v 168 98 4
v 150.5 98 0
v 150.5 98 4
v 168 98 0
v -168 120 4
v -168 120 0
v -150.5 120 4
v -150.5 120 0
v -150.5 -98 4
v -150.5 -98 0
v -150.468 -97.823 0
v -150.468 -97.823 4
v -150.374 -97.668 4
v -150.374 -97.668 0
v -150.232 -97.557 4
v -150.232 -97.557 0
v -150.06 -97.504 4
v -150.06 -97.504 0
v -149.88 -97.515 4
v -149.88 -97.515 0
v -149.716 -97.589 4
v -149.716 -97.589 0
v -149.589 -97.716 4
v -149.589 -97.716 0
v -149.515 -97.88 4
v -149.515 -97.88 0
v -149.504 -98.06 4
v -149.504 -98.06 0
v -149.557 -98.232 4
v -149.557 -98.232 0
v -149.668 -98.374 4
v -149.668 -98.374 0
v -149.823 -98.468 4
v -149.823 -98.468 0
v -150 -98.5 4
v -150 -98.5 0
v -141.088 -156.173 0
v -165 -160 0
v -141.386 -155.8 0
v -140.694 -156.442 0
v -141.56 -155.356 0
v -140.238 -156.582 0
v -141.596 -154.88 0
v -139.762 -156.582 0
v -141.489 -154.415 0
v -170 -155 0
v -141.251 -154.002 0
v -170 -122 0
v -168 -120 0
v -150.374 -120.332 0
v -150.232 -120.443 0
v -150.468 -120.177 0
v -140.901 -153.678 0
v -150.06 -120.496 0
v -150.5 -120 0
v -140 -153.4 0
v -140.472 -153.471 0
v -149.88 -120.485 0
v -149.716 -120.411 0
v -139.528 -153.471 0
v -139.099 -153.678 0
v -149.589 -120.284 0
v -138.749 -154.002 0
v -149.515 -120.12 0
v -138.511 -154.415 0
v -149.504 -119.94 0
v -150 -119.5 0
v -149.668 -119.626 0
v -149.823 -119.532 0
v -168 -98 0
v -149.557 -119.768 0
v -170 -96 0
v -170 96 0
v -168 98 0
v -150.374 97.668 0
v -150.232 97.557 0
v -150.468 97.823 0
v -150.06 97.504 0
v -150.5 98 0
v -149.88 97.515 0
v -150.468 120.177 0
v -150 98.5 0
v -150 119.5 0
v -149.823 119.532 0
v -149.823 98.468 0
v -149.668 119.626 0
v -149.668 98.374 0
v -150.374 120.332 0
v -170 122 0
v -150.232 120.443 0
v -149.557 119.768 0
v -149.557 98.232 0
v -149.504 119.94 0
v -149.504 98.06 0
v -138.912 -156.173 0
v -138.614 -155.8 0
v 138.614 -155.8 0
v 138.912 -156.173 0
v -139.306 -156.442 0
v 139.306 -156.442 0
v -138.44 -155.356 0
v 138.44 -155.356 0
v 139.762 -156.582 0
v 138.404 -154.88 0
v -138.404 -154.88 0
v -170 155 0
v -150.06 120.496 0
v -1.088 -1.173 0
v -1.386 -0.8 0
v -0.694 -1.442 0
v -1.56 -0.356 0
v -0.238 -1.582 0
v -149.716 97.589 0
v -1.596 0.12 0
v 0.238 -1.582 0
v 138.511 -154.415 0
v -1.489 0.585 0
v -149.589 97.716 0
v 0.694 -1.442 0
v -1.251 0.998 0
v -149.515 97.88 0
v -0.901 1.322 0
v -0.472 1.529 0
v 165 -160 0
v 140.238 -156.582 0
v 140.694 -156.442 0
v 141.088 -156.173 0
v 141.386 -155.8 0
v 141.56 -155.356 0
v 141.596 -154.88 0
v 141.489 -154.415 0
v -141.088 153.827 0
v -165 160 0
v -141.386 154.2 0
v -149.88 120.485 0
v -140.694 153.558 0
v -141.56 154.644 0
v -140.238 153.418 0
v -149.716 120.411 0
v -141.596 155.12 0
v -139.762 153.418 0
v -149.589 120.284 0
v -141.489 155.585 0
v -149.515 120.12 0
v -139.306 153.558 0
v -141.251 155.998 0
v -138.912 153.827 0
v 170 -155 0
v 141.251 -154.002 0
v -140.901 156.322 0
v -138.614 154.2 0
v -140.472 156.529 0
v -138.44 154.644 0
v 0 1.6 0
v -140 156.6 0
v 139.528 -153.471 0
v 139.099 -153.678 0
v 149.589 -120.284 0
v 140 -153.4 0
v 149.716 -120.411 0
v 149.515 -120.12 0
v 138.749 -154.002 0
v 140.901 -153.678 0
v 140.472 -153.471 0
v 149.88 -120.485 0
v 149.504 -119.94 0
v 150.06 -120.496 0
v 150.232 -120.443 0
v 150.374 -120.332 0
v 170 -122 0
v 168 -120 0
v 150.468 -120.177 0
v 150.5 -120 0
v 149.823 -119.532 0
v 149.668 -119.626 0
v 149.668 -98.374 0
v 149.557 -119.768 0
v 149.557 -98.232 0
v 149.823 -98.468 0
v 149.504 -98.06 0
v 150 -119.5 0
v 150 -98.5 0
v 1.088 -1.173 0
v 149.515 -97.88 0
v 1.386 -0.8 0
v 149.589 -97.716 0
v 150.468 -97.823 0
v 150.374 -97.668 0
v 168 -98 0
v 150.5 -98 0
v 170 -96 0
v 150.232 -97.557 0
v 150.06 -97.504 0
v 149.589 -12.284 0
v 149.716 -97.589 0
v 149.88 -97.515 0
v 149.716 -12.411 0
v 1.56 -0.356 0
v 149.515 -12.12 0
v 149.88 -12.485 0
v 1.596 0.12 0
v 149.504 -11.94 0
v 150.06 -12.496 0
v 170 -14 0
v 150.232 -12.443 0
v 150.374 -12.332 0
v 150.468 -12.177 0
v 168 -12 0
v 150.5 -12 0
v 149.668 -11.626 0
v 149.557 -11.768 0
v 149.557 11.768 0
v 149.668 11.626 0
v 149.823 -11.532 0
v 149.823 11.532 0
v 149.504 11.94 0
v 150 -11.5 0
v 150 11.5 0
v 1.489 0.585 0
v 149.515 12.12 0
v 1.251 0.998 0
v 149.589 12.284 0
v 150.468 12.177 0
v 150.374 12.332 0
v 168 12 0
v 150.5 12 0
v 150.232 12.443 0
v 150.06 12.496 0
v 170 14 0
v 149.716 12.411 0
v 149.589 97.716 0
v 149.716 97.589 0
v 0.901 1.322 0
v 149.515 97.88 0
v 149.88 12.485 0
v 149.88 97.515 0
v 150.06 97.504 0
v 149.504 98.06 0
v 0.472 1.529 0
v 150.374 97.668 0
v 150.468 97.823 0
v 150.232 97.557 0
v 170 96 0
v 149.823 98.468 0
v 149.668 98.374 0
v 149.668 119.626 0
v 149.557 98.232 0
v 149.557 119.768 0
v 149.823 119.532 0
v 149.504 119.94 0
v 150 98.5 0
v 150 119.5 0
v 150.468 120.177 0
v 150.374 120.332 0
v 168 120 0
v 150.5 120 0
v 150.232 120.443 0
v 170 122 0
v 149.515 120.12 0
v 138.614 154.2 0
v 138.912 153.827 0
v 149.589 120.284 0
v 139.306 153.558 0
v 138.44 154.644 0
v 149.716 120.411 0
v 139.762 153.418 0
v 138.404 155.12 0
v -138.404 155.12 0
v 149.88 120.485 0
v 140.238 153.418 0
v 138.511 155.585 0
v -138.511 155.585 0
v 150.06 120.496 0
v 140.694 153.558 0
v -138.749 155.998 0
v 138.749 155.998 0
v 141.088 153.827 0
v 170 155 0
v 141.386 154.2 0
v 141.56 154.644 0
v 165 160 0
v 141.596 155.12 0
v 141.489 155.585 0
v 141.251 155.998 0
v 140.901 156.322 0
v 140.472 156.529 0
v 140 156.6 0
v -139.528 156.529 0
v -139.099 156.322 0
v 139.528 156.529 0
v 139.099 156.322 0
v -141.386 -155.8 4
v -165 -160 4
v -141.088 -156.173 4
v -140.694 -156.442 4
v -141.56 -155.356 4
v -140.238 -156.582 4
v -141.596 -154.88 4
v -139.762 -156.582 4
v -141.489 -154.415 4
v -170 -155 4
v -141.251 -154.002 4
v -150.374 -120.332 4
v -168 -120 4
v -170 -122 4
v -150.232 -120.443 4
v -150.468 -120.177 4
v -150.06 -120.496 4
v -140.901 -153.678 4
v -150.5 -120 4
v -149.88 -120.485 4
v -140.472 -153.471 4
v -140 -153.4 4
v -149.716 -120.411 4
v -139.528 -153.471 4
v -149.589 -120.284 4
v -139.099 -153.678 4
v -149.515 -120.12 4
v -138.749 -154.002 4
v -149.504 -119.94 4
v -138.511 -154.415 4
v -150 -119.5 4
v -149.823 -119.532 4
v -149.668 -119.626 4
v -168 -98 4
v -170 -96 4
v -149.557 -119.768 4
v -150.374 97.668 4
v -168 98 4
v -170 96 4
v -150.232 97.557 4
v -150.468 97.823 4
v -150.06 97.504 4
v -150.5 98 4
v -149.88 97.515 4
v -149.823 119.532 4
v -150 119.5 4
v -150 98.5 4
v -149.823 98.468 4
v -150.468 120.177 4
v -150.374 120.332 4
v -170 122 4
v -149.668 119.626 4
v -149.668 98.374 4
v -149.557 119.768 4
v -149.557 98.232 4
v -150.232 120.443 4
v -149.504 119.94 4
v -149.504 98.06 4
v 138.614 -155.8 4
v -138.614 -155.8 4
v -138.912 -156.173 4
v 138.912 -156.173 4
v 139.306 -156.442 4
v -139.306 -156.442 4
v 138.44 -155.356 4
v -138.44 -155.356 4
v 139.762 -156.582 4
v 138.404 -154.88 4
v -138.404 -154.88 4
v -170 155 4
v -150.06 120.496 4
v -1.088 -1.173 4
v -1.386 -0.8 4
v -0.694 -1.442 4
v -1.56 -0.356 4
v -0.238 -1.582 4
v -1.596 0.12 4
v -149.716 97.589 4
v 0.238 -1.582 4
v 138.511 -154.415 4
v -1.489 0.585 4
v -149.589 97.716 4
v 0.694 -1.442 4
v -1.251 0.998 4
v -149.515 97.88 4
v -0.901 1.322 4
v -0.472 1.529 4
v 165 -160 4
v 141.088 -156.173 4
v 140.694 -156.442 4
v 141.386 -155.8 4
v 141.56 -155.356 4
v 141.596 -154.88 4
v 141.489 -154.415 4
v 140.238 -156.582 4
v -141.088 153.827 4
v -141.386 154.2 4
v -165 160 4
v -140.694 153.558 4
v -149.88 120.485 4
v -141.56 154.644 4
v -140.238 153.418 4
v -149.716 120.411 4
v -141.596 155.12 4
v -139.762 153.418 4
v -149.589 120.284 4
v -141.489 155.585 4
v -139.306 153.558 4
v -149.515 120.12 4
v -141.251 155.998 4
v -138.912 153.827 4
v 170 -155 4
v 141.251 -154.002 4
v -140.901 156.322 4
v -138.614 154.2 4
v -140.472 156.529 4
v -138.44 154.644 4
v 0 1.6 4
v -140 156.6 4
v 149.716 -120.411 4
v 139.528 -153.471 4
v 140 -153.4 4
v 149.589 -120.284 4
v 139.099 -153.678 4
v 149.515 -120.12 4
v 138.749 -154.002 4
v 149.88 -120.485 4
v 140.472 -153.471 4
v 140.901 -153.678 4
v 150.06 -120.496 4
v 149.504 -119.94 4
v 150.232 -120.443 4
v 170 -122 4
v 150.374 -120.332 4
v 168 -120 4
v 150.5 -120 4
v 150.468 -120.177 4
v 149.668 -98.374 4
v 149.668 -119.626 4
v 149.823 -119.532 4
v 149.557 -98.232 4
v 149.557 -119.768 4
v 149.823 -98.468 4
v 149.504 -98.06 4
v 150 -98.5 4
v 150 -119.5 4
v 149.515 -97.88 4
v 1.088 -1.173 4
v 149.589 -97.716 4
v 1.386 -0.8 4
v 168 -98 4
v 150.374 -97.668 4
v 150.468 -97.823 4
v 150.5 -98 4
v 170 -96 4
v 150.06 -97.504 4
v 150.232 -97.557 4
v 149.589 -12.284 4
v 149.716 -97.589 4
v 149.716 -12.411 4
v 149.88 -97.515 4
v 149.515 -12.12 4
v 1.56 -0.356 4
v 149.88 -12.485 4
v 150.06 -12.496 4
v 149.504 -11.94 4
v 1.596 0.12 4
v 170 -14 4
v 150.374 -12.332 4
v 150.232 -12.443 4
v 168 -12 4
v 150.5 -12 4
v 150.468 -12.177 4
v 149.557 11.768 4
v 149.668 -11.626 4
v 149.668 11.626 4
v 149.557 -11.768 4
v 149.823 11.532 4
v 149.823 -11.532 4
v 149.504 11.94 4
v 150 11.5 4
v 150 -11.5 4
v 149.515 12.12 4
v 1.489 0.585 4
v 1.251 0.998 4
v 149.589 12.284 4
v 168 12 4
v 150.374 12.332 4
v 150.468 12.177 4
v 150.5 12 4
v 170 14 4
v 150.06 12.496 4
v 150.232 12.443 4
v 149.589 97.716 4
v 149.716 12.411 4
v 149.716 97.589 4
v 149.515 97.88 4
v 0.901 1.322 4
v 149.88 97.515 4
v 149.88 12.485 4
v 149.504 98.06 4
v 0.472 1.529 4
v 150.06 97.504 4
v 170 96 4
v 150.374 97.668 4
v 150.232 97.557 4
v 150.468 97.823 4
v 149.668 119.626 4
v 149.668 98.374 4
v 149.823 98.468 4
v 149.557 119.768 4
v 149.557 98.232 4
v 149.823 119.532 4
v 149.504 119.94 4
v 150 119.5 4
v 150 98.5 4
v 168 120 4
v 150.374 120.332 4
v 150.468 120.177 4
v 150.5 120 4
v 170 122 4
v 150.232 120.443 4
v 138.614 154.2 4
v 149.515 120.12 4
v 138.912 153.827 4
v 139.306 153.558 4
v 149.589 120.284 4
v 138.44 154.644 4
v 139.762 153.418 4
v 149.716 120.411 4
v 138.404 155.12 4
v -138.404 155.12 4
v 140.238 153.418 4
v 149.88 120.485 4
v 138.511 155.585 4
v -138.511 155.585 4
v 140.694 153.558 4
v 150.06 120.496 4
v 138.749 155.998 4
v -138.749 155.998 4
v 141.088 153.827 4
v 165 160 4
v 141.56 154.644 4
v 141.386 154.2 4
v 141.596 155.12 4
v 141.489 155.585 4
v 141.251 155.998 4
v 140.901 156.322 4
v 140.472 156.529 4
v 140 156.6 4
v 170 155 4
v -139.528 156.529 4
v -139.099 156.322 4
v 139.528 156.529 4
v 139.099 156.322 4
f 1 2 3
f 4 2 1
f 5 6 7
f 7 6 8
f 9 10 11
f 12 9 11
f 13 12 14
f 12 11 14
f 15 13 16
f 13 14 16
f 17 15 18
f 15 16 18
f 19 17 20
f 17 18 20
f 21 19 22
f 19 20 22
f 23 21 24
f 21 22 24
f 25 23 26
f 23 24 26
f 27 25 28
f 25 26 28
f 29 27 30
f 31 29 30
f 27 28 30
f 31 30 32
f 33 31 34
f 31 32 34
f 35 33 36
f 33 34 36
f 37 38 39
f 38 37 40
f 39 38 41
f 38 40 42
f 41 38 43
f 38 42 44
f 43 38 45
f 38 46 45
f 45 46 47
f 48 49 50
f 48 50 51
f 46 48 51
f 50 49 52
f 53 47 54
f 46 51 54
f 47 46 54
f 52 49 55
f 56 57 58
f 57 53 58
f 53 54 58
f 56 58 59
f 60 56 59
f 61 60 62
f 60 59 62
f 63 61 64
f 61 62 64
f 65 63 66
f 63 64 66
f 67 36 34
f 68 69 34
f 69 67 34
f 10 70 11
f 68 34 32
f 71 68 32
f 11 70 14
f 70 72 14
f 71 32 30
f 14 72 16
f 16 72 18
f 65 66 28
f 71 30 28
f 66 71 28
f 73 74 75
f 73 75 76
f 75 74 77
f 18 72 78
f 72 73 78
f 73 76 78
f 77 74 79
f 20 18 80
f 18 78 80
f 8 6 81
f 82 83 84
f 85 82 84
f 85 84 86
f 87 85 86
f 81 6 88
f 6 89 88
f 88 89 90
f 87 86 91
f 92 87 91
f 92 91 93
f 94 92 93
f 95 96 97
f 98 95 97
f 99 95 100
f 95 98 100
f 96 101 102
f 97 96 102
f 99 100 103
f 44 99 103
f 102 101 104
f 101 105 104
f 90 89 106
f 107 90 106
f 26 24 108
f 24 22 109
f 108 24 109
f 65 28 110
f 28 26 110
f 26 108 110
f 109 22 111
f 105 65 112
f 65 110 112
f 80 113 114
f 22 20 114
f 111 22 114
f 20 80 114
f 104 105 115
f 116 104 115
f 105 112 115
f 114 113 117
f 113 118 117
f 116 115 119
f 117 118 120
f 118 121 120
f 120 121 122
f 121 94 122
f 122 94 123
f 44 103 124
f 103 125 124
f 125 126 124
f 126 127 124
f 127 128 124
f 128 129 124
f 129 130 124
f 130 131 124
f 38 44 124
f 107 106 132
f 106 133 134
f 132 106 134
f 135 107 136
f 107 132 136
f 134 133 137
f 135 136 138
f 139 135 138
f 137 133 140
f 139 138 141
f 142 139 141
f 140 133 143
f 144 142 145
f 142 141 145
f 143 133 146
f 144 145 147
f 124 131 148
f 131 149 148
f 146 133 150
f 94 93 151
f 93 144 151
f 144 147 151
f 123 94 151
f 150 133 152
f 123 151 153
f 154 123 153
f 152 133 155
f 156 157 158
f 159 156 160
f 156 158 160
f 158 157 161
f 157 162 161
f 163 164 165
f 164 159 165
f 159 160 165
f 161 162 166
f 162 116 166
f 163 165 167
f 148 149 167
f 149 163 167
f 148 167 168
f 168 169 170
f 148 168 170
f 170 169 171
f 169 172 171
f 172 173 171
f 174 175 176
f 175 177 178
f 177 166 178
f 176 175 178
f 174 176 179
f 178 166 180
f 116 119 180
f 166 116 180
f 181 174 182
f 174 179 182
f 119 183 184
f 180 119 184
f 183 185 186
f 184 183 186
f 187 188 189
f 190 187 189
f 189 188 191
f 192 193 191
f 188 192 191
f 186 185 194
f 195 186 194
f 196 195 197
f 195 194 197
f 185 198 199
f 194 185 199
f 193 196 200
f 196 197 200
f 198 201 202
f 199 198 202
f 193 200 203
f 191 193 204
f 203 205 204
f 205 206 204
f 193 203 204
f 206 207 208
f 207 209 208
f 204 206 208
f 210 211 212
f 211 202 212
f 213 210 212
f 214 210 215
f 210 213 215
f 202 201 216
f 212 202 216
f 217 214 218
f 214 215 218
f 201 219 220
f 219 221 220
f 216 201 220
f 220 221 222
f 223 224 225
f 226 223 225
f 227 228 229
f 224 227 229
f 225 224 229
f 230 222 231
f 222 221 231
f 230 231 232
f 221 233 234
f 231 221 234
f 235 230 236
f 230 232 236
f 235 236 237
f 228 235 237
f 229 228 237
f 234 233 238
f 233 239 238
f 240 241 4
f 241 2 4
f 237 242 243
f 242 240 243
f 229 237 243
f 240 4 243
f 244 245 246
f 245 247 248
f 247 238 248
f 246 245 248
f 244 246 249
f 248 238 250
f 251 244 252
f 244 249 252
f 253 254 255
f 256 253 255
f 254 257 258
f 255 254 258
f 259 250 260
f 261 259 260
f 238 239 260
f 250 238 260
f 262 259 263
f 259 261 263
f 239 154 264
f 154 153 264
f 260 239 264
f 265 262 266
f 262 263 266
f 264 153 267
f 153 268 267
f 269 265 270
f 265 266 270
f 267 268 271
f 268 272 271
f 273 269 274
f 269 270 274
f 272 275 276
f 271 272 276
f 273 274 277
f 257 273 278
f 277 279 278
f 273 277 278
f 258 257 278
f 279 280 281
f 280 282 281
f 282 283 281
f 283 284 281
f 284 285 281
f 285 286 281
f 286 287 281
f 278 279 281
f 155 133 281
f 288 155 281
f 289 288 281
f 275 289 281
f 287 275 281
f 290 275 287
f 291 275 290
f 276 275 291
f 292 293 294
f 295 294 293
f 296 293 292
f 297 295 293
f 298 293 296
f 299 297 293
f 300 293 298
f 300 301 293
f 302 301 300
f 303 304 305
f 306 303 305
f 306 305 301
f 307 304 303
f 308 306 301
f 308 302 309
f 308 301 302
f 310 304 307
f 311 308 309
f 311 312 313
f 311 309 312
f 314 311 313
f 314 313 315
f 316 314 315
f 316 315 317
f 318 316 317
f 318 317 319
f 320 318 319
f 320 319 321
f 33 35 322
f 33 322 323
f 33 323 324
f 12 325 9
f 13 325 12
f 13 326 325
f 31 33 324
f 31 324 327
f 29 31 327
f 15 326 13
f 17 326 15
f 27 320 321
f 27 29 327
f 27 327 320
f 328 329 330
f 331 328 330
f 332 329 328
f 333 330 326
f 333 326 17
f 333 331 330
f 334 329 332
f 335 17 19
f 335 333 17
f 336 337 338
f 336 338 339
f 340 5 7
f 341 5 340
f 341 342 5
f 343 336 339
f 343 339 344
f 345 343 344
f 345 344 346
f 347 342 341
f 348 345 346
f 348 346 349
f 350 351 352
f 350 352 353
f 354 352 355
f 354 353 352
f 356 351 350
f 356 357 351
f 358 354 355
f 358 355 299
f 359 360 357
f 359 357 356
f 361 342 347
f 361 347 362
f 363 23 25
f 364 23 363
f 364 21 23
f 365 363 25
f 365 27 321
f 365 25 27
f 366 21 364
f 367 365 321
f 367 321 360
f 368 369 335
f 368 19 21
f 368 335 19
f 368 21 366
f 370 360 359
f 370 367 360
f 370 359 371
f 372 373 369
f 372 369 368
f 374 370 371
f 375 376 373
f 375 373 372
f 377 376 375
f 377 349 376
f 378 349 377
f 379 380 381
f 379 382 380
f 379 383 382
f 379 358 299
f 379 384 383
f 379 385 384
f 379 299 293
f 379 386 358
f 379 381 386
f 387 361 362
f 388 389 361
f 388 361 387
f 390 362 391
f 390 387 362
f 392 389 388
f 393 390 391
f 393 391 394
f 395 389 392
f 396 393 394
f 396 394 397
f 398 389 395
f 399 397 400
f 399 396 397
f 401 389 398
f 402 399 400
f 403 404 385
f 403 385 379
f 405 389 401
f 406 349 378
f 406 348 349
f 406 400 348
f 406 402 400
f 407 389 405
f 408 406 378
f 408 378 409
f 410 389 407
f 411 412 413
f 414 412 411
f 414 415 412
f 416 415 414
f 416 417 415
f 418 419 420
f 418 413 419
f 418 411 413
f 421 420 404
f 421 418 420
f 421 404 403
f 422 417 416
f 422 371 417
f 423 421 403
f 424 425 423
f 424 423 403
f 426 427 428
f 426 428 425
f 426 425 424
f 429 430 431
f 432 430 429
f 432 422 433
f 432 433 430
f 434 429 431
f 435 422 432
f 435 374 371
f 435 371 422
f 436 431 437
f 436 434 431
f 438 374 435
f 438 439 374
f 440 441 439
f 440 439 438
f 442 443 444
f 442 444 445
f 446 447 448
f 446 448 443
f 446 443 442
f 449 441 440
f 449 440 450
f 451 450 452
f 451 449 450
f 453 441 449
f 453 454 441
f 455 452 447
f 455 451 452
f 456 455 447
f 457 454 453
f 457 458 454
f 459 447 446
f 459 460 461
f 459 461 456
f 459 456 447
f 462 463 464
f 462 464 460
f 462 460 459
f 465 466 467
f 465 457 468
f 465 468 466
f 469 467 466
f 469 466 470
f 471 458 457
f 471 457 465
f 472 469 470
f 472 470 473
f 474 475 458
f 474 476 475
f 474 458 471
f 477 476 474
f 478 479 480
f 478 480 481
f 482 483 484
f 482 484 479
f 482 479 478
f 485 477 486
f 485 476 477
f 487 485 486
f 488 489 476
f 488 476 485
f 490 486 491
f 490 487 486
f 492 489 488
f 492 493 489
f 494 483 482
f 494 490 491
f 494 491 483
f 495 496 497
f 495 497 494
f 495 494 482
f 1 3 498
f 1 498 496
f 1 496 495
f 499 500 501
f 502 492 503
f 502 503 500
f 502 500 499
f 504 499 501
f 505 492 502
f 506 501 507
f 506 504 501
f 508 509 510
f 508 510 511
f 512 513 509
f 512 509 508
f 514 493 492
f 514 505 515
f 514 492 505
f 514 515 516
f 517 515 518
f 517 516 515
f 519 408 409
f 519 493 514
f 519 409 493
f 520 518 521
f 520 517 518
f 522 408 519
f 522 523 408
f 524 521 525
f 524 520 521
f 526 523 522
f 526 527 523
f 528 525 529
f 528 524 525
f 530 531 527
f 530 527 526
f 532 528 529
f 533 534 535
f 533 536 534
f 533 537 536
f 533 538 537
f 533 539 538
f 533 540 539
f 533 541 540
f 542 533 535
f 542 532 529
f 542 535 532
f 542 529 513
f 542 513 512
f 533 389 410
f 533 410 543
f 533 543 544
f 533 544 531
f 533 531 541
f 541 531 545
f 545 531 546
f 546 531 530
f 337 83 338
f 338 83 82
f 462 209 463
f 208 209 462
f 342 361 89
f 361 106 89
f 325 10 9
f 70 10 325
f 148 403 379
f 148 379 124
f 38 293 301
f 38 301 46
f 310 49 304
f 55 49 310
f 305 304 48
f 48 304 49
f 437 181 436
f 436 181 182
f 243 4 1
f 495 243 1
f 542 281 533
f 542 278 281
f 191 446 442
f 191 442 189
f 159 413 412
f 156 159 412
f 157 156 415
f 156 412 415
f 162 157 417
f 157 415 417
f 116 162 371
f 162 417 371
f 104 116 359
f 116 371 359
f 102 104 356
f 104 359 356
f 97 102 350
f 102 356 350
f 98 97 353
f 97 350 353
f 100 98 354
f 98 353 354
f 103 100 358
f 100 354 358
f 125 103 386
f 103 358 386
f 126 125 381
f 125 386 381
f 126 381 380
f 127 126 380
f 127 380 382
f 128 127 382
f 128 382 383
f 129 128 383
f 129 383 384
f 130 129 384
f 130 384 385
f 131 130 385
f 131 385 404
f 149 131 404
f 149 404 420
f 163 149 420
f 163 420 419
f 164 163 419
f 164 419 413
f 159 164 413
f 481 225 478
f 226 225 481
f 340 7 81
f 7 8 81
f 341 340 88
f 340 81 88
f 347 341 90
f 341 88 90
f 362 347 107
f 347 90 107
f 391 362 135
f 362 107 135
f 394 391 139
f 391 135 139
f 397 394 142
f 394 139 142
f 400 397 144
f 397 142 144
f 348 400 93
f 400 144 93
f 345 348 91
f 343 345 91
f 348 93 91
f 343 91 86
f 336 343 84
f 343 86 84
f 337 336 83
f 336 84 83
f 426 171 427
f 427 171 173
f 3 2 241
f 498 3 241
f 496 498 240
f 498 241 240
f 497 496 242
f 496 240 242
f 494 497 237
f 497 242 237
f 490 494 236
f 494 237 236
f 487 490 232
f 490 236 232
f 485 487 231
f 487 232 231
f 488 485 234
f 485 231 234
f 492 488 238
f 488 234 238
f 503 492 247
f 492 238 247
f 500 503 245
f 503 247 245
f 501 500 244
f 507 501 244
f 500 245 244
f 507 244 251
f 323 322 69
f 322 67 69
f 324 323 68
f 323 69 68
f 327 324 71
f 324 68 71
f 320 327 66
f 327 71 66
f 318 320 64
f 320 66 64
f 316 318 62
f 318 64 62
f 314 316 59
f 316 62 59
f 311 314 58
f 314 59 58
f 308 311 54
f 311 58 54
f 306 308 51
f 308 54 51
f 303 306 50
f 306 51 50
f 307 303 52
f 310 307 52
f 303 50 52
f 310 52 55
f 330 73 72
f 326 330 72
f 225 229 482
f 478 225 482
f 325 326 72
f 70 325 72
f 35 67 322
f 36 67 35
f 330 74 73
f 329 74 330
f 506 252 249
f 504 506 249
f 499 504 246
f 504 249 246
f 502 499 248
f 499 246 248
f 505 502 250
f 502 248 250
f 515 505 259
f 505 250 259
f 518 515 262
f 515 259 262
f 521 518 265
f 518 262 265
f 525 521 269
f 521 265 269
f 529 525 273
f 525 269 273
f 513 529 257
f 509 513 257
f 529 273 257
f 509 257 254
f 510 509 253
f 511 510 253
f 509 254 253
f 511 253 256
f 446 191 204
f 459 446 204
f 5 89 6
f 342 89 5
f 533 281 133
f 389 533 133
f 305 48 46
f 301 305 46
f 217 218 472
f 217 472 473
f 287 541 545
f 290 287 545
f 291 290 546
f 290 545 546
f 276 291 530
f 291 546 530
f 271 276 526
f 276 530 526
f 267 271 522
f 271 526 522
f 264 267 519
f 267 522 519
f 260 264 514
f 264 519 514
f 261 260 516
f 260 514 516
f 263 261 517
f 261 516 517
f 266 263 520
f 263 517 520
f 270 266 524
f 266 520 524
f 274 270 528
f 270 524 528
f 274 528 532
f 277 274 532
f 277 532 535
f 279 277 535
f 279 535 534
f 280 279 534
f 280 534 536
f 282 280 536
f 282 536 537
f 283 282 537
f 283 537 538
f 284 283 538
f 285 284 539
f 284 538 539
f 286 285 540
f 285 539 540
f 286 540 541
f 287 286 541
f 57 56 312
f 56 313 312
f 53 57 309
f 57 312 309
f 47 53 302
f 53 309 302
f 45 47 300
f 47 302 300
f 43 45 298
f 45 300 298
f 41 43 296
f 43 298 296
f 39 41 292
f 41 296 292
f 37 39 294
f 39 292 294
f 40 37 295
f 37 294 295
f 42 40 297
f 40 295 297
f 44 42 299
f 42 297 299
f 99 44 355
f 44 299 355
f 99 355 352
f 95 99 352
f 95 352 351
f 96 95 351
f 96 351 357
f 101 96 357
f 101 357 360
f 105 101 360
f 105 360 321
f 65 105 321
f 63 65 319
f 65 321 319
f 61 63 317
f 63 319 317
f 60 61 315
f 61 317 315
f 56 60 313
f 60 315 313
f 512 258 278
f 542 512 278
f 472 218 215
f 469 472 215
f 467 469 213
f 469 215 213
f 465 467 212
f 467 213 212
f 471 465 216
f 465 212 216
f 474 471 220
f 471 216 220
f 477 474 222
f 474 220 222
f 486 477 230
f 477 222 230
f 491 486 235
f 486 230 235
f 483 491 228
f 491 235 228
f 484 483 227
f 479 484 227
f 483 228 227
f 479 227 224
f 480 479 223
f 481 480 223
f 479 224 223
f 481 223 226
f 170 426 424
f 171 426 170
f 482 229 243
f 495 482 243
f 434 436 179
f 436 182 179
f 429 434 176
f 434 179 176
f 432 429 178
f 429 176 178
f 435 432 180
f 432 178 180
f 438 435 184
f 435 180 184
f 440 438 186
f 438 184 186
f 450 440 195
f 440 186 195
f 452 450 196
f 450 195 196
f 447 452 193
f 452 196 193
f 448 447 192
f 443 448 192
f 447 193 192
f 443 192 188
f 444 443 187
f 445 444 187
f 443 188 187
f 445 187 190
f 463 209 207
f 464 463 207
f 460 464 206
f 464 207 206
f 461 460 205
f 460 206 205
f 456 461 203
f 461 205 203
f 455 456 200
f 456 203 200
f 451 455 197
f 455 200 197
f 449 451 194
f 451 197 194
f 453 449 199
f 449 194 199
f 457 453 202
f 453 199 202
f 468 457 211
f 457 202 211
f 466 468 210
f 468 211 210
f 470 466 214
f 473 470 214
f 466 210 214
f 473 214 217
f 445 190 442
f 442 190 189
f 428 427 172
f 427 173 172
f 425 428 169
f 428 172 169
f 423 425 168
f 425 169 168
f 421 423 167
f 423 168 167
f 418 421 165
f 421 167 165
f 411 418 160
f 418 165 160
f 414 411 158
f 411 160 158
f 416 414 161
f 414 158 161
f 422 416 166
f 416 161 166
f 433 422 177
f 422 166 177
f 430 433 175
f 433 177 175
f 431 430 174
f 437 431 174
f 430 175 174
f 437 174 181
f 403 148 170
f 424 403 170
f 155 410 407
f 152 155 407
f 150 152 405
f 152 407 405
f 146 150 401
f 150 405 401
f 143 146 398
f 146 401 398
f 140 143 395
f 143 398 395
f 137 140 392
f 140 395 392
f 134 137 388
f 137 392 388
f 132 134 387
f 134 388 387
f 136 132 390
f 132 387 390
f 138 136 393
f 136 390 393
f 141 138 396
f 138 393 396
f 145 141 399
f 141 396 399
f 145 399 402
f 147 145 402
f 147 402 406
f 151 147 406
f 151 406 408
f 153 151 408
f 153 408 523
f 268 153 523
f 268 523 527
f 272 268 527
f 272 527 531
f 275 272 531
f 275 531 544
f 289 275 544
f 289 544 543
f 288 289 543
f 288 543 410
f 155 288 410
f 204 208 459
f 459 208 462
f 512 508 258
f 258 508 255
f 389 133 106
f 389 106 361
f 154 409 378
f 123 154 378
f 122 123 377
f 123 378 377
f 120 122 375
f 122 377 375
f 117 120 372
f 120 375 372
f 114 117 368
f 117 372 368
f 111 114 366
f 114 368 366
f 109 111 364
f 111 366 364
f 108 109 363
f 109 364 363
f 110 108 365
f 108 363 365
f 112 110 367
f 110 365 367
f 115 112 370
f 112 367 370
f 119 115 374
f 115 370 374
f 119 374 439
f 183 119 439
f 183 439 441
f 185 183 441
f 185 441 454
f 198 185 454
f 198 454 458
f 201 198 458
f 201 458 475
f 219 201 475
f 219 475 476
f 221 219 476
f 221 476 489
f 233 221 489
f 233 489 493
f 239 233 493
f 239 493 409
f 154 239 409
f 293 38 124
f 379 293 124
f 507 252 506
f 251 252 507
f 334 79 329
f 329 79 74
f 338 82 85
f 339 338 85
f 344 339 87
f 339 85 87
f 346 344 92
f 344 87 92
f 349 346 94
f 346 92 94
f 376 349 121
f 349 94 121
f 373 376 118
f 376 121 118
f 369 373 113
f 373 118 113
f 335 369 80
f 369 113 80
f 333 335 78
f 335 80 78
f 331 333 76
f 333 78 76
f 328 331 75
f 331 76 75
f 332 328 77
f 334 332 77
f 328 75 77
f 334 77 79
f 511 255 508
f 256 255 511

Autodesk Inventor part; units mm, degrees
ref_plane "YZ Plane" through (0, 0, 0) normal (1, 0, 0) x (0, 1, 0)
ref_plane "XZ Plane" through (0, 0, 0) normal (0, 1, 0) x (-1, 0, 0)
ref_plane "XY Plane" through (0, 0, 0) normal (0, 0, 1) x (1, 0, 0)
sketch "Sketch1" plane through (0, 0, 0) normal (0, 0, 1) x (1, 0, 0)
  line L0 (-170, -160) -> (170, -160)
  line L1 (170, -160) -> (170, -120)
  line L2 (170, 160) -> (-170, 160)
  line L3 (-170, 160) -> (-170, 120)
  line L4 (-170, -160) -> (170, 160) construction
  line L5 (170, -160) -> (-170, 160) construction
  line L6 (-140, -155) -> (140, -155) construction
  line L7 (140, -155) -> (140, 155) construction
  line L8 (140, 155) -> (-140, 155) construction
  line L9 (-140, 155) -> (-140, -155) construction
  line L10 (-140, -155) -> (140, 155) construction
  line L11 (140, -155) -> (-140, 155) construction
  line L12 (-150, -150) -> (150, -150) construction
  line L13 (150, -150) -> (150, 150) construction
  line L14 (150, 150) -> (-150, 150) construction
  line L15 (-150, 150) -> (-150, -150) construction
  line L16 (-150, -150) -> (150, 150) construction
  line L17 (150, -150) -> (-150, 150) construction
  line L18 (170, 120) -> (150, 120)
  line L19 (150, 120) -> (150, 98)
  line L20 (150, 98) -> (170, 98)
  line L21 (170, 98) -> (170, 120) construction
  line L22 (0, -160) -> (0, 160) construction
  line L23 (-170, 0) -> (170, 0) construction
  line L24 (-170, 120) -> (-150, 120)
  line L25 (-150, 120) -> (-150, 98)
  line L26 (-150, 98) -> (-170, 98)
  line L27 (-170, 98) -> (-170, 120) construction
  line L28 (170, -120) -> (150, -120)
  line L29 (150, -120) -> (150, -98)
  line L30 (150, -98) -> (170, -98)
  line L31 (170, -98) -> (170, -120) construction
  line L32 (-170, -120) -> (-150, -120)
  line L33 (-150, -98) -> (-170, -98)
  line L34 (-170, -98) -> (-170, -120) construction
  line L35 (-150, -120) -> (-150, -98)
  line L36 (-170, 98) -> (-170, -98)
  line L37 (-170, -120) -> (-170, -160)
  line L38 (-170, -98) -> (-170, -120)
  line L39 (170, -120) -> (170, -98)
  line L40 (170, -98) -> (170, 98)
  line L41 (170, 98) -> (170, 120)
  line L42 (170, 120) -> (170, 160)
  line L43 (-170, 120) -> (-170, 98) construction
  line L44 (170, 12) -> (150, 12)
  line L45 (150, 12) -> (150, -12)
  line L46 (150, -12) -> (170, -12)
  line L47 (170, -12) -> (170, 12)
  point P0 (0, 0)
  point P1 (0, 0)
  dimension "d0" = 340
  dimension "d1" = 320
  dimension "d4" = 280
  dimension "d5" = 310
  dimension "d13" = 300
  dimension "d14" = 300
  dimension "d15" = 22
  dimension "d16" = 30
  dimension "d27" = 24
extrude "Extrusion1" add sketch "Sketch1" along normal blind 4 contours L37 L32 L35 L33 L36 L26 L25 L24 L3 L2 L42 L18 L19 L20 L40 L44 L45 L46 L30 L29 L28 L1 L0
hole "Hole1" at (-140, 155, 0) at (-140, -155, 0) at (140, -155, 0) at (140, 155, 0) at (0, 0, 0) direction (0, 0, 1) diameter 3.2 end through all
sketch "Szkic2" plane through (0, 0, 4) normal (0, 0, 1) x (1, 0, 0)
  point P0 (-150, 98)
  point P1 (-150, 120)
  point P2 (-150, -120)
  point P3 (-150, -98)
  point P4 (150, -120)
  point P5 (150, -98)
  point P6 (150, 98)
  point P7 (150, 120)
  point P8 (150, 12)
  point P9 (150, -12)
hole "Otwór2" at (-150, 98, 4) at (-150, 120, 4) at (-150, -120, 4) at (-150, -98, 4) at (150, -120, 4) at (150, -98, 4) at (150, 98, 4) at (150, -12, 4) at (150, 12, 4) at (150, 120, 4) direction (0, 0, -1) diameter 1 end through all
chamfer "Faza1" distance 5 angle 45 4 edges at (-170, -160, 2) (170, -160, 2) (170, 160, 2) (-170, 160, 2)
chamfer "Faza2" distance 2 angle 45 10 edges at (170, -120, 2) (170, -98, 2) (170, -12, 2) (170, 12, 2) (170, 98, 2) (170, 120, 2) (-170, -120, 2) (-170, -98, 2) (-170, 120, 2) (-170, 98, 2)
properties part number "stolik"
